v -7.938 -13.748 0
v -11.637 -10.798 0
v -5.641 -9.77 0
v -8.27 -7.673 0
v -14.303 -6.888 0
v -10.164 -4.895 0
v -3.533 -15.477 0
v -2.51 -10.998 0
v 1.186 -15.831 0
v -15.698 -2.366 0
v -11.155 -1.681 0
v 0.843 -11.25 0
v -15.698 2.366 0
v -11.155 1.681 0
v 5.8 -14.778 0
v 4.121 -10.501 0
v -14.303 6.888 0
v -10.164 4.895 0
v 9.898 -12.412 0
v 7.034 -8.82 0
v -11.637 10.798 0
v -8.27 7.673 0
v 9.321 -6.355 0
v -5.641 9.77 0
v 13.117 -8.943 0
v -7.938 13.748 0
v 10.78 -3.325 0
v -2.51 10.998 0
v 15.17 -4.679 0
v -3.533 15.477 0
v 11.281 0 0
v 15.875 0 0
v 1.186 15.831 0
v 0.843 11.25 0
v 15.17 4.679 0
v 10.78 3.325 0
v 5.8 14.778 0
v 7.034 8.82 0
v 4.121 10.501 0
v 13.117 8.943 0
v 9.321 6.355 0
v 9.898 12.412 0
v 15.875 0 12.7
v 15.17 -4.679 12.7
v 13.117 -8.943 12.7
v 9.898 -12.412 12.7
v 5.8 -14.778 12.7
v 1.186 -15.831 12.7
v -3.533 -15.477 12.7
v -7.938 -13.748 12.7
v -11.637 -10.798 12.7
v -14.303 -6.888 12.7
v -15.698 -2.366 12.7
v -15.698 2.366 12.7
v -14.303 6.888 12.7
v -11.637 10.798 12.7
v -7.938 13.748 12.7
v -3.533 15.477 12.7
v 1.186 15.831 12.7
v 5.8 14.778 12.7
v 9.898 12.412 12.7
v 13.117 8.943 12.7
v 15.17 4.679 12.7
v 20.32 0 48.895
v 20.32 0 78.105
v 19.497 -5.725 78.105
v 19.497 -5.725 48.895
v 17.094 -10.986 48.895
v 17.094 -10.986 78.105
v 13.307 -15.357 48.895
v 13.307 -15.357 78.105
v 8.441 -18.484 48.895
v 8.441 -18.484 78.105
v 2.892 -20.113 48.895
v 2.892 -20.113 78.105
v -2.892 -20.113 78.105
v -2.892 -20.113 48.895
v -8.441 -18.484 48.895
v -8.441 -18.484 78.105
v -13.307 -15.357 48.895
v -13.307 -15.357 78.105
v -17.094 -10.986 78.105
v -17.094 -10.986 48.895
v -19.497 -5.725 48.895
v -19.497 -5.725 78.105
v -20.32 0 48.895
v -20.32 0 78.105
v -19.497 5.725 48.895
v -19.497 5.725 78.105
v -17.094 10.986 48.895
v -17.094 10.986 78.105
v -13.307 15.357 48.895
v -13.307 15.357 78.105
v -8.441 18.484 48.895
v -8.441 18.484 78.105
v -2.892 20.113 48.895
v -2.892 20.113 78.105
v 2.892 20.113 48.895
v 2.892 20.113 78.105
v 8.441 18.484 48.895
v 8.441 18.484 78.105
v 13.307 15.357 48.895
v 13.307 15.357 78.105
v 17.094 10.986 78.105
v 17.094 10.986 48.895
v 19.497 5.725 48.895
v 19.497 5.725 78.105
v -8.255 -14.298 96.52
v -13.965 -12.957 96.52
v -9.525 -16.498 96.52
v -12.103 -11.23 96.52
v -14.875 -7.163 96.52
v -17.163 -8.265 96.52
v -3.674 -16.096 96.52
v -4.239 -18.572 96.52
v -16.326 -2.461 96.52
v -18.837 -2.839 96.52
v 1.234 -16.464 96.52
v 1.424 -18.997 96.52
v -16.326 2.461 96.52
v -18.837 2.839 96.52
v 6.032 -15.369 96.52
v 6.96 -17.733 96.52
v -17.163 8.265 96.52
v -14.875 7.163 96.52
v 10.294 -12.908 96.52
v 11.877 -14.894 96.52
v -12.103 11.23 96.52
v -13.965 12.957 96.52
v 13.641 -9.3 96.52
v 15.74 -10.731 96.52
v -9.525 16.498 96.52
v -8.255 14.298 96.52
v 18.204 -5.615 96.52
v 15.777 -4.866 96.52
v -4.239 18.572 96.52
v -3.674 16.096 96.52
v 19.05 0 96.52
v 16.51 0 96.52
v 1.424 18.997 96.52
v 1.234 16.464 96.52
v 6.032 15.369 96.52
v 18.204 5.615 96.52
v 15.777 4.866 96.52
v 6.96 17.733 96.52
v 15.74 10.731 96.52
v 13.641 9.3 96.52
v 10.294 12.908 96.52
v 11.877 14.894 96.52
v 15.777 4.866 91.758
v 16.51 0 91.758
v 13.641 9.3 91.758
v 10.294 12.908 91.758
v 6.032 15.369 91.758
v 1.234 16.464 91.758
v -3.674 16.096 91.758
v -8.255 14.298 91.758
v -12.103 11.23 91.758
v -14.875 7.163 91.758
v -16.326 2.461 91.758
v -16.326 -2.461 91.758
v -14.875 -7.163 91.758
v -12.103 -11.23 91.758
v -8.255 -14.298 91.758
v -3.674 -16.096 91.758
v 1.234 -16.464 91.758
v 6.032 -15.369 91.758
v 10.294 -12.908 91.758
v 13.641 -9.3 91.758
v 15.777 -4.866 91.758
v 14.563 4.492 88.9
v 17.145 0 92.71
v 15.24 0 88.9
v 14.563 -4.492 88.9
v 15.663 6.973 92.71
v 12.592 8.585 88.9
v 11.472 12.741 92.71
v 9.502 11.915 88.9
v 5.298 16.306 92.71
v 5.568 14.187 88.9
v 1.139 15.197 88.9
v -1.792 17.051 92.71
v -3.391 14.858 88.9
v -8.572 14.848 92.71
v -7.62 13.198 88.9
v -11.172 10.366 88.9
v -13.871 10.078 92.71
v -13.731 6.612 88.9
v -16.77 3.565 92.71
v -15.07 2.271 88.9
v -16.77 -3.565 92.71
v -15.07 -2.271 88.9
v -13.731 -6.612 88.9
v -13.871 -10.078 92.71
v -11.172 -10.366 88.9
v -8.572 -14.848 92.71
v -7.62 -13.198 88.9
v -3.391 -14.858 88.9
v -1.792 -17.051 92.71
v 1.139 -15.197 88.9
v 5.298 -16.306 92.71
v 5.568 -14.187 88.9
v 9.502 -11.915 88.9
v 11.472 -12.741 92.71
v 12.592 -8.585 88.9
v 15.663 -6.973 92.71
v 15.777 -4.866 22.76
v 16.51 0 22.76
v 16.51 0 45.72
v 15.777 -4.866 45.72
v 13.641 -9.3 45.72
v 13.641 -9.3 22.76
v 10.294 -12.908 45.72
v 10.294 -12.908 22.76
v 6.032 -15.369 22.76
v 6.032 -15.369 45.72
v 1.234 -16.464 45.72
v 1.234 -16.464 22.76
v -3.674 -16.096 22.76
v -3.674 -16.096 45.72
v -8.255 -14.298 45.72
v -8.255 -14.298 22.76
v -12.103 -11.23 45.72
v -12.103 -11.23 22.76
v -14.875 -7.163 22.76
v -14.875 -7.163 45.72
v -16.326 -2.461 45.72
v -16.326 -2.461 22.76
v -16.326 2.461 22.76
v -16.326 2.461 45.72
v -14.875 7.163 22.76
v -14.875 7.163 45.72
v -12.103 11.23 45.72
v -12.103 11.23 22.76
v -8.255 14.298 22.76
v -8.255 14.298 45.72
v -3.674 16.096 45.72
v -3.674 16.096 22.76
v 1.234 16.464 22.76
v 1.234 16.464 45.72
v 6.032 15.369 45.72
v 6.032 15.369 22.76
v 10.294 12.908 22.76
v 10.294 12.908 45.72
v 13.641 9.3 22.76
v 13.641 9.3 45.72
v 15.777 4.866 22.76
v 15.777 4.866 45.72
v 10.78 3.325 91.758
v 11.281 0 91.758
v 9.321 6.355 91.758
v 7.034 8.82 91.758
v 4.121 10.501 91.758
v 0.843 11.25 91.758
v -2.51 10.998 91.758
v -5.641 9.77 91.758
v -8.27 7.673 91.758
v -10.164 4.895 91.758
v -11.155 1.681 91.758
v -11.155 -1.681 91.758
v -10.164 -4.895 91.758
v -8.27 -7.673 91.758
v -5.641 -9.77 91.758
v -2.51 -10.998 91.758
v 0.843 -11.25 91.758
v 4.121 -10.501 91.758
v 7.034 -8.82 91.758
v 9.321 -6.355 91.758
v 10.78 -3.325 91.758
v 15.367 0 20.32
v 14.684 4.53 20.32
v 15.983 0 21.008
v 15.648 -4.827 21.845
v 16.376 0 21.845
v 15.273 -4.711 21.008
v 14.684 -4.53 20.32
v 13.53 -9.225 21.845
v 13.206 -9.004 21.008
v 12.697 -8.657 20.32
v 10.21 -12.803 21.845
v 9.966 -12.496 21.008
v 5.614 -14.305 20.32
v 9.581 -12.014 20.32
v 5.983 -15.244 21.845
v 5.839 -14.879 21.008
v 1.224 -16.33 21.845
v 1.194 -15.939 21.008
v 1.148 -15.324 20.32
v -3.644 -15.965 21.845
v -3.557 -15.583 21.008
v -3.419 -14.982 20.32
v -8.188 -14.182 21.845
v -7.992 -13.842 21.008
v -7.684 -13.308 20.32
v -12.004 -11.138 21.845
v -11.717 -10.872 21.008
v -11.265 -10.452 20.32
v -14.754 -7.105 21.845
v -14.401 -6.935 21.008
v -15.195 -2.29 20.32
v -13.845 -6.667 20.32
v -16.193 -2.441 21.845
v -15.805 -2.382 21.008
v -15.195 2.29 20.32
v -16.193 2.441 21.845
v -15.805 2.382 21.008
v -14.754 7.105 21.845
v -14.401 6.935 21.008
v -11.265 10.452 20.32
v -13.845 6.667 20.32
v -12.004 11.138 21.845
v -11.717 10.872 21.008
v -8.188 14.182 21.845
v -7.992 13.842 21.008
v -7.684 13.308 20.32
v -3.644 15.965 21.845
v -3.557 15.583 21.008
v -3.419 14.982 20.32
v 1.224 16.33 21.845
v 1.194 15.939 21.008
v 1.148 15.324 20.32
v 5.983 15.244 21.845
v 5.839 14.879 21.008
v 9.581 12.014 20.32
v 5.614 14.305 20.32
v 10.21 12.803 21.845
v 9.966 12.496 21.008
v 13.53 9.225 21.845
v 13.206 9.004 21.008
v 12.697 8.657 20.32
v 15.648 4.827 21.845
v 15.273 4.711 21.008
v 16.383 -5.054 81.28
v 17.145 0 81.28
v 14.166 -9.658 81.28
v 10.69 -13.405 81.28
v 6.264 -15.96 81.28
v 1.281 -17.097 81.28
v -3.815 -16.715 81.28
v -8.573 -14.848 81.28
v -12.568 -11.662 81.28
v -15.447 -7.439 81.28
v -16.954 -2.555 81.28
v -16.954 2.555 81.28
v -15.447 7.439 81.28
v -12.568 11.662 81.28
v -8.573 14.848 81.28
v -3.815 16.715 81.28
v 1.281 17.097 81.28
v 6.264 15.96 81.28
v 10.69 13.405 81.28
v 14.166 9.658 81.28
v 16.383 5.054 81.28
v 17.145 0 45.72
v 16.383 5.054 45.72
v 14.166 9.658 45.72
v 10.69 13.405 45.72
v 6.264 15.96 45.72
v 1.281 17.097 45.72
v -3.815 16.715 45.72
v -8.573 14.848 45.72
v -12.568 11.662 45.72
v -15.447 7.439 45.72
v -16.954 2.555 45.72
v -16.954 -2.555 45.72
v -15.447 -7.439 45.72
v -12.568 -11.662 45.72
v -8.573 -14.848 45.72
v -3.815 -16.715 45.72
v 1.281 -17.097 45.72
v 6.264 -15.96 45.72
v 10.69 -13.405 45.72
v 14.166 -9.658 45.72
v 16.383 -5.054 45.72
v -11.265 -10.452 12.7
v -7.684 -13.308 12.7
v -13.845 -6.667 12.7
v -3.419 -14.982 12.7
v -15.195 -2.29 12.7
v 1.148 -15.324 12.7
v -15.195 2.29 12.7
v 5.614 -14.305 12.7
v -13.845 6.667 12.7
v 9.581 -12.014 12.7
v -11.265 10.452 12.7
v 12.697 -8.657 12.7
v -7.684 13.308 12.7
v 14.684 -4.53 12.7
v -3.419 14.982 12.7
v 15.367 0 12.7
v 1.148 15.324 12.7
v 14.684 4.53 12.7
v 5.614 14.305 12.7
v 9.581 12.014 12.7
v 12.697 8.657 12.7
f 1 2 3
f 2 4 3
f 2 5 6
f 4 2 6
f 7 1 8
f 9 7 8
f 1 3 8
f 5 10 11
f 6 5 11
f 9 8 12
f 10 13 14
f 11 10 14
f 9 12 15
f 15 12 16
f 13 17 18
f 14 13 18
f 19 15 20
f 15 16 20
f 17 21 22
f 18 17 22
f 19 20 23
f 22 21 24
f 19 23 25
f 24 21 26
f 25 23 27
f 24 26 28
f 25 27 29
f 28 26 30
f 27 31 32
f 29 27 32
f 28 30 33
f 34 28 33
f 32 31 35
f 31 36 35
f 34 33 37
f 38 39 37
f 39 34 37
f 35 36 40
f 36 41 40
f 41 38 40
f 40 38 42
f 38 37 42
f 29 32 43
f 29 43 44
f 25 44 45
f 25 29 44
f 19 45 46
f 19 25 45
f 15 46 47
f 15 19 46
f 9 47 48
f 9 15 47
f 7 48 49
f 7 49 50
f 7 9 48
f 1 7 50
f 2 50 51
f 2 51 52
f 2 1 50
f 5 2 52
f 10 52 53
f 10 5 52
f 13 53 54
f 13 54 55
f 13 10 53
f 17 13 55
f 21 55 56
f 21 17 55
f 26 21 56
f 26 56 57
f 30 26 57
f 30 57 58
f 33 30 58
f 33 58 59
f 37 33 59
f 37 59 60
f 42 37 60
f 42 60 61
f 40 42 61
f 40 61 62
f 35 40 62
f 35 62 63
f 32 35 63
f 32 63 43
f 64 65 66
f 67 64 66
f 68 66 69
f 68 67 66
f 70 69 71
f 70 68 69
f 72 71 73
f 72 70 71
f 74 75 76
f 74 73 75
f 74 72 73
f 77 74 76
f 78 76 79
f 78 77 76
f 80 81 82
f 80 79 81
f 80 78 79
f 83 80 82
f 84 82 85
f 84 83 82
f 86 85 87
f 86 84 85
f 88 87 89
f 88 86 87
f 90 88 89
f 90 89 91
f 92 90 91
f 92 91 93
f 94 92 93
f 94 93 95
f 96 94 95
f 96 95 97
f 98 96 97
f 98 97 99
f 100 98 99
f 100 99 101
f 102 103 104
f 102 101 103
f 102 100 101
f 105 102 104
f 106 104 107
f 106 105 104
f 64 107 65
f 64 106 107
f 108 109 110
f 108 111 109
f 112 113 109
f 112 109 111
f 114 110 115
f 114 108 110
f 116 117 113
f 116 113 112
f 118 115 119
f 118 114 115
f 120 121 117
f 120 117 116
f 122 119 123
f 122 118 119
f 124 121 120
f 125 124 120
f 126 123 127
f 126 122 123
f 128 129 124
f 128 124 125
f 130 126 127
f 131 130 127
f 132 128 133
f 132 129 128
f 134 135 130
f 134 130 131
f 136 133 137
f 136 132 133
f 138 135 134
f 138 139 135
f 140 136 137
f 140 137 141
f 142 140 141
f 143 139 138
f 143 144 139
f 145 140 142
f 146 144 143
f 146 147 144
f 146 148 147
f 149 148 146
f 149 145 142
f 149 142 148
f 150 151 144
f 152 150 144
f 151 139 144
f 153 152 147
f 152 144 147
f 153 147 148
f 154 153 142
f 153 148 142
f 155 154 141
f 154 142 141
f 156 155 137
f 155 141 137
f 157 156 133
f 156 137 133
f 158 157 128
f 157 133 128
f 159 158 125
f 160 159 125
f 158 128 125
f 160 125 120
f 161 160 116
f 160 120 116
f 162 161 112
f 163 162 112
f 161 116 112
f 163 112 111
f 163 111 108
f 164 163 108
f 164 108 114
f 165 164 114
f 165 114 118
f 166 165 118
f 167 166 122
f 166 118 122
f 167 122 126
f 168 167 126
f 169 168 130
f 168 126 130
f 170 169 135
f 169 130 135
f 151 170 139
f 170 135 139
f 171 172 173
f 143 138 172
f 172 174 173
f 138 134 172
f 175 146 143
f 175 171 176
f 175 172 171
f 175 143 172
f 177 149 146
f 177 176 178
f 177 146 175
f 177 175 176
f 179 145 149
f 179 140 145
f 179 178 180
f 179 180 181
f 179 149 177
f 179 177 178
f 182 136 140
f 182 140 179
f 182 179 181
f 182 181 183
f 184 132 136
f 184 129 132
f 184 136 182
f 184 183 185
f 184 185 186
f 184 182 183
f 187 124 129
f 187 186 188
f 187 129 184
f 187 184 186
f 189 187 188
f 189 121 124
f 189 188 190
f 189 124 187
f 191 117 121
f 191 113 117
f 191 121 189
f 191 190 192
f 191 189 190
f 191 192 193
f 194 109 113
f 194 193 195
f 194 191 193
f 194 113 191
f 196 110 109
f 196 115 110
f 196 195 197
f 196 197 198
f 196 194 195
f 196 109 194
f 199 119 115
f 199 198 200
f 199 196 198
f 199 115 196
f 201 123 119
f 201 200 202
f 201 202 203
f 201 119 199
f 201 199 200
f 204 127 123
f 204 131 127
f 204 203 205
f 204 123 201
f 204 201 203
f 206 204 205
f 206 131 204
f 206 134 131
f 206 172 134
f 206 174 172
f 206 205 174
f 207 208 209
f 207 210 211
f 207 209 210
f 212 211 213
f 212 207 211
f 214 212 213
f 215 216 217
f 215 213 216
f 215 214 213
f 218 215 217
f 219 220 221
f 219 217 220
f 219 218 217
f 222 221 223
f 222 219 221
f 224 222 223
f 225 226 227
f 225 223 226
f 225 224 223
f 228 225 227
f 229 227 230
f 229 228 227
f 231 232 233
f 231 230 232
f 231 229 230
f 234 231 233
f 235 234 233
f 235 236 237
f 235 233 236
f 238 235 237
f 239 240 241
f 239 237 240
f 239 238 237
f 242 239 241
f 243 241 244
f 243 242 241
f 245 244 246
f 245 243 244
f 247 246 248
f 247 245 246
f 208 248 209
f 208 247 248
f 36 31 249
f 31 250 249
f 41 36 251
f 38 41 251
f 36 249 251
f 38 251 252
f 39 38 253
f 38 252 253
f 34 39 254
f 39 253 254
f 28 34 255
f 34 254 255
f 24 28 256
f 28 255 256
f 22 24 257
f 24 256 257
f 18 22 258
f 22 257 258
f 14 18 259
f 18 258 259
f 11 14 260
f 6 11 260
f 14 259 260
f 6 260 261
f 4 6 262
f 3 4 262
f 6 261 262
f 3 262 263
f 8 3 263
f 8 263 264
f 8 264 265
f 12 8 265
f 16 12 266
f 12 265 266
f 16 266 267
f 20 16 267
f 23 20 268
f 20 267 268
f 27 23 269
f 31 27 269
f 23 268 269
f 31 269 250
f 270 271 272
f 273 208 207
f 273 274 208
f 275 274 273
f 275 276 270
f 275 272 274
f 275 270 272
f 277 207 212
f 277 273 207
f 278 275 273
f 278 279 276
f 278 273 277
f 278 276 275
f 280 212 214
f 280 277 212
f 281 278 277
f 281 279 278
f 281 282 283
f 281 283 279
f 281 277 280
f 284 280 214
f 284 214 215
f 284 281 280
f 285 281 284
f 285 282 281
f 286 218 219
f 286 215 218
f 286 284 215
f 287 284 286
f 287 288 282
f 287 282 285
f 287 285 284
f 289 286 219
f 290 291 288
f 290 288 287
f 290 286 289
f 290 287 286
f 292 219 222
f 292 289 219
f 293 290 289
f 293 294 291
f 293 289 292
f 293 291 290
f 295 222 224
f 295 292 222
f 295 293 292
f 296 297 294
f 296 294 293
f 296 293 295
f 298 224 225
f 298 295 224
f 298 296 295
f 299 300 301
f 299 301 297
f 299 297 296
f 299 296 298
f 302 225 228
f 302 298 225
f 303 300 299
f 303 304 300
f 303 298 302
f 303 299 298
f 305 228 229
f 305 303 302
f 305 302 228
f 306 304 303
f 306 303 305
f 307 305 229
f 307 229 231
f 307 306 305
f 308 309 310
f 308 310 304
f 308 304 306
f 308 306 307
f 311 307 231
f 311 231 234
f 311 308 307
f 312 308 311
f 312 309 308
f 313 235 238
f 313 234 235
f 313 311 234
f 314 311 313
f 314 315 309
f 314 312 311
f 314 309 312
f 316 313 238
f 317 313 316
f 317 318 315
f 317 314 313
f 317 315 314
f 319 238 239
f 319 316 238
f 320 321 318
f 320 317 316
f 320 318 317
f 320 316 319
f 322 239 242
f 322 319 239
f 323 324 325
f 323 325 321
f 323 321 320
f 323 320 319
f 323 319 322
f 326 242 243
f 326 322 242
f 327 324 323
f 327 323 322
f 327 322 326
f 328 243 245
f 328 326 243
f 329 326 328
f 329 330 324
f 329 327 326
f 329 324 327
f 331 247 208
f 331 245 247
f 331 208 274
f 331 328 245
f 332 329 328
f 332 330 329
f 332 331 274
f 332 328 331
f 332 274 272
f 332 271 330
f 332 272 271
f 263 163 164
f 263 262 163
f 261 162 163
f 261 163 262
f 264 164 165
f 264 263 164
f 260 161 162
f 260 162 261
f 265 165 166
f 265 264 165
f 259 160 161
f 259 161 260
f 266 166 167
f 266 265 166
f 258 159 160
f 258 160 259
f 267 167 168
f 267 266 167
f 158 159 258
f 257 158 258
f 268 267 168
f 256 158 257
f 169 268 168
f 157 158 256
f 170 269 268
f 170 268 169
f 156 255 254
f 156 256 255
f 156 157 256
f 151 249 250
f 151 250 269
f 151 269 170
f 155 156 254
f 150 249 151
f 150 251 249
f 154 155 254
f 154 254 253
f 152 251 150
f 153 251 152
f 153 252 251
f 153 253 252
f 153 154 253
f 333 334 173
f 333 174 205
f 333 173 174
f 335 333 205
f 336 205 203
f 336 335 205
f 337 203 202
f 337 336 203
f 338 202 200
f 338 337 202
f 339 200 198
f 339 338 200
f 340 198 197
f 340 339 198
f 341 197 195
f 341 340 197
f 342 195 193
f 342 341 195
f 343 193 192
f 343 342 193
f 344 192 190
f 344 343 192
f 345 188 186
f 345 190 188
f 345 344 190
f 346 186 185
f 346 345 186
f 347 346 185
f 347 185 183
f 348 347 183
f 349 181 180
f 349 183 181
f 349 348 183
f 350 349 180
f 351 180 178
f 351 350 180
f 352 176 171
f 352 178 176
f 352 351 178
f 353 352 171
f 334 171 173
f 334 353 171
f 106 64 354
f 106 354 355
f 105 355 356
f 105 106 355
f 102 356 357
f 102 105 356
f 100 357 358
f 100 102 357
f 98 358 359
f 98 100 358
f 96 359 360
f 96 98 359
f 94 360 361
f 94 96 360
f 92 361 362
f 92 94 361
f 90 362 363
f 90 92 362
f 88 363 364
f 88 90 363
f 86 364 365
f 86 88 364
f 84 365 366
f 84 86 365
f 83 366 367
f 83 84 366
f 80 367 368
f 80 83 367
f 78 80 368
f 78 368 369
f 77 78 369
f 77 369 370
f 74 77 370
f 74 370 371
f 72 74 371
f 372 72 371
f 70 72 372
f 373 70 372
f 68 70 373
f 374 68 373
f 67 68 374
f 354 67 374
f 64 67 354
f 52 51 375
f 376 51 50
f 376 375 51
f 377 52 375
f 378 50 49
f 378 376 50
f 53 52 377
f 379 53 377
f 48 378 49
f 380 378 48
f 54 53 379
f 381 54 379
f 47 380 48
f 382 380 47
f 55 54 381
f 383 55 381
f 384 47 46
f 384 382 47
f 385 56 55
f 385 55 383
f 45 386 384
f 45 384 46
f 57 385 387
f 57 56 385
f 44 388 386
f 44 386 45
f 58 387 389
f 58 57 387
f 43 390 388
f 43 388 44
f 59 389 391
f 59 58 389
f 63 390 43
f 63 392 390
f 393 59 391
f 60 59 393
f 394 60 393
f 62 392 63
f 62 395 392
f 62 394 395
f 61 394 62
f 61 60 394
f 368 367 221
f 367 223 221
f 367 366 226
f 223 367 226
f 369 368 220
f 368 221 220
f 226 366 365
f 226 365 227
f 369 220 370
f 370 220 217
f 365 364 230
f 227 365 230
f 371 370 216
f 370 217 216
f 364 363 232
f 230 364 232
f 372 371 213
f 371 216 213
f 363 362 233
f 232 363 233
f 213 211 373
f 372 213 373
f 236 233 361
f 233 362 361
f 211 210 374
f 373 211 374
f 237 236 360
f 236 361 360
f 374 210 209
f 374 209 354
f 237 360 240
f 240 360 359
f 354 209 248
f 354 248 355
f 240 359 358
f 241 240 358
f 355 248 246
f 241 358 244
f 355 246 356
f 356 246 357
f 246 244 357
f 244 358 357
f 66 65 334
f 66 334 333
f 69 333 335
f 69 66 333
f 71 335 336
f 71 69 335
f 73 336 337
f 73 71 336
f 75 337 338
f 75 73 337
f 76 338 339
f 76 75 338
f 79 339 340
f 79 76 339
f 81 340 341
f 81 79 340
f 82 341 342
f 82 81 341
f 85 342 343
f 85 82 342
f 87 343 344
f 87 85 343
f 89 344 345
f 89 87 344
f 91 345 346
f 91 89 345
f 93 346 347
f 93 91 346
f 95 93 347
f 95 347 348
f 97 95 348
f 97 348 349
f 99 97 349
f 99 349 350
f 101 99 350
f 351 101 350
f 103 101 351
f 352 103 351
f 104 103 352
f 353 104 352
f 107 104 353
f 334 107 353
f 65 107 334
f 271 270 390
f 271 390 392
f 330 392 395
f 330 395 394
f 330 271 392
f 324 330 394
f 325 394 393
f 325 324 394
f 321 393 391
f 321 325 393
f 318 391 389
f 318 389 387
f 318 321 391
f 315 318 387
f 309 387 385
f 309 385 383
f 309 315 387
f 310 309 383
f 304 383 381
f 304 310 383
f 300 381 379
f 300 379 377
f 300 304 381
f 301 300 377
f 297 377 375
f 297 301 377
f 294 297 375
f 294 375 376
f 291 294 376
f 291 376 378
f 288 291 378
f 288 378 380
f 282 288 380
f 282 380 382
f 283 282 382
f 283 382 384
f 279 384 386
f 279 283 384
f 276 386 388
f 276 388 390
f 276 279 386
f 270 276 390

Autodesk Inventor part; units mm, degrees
ref_plane "YZ Plane" through (0, 0, 0) normal (1, 0, 0) x (0, 1, 0)
ref_plane "XZ Plane" through (0, 0, 0) normal (0, 1, 0) x (-1, 0, 0)
sketch "Sketch1" plane through (0, 0, 0) normal (0, 0, 1) x (1, 0, 0)
  circle A0 centre (0, 0) radius 15.875
  dimension "d0" = 31.75
extrude "Extrusion1" add sketch "Sketch1" along normal blind 20.32
sketch "Sketch2" plane through (0, 0, 20.32) normal (0, 0, 1) x (1, 0, 0)
  circle A0 centre (0, 0) radius 15.367
  circle A1 centre (0, 0) radius 16.7085
  dimension "d5" = 30.734
extrude "Extrusion2" cut sketch "Sketch2" against normal blind 7.62
sketch "Sketch3" plane through (0, 0, 20.32) normal (0, 0, 1) x (1, 0, 0)
  circle A0 centre (0, 0) radius 16.51
  dimension "d6" = 33.02
extrude "Extrusion3" add sketch "Sketch3" along normal blind 25.4
fillet "Fillet1" radius 3.175 1 edges at (-16.51, 0, 20.32)
sketch "Sketch4" plane through (0, 0, 45.72) normal (0, 0, 1) x (1, 0, 0)
  circle A0 centre (0, 0) radius 20.32
  dimension "d10" = 40.64
extrude "Extrusion4" add sketch "Sketch4" along normal blind 35.56
chamfer "Chamfer1" distance 3.175 angle 45 2 edges at (-20.32, 0, 45.72) (-20.32, 0, 81.28)
sketch "Sketch5" plane through (0, 0, 0) normal (0, 1, 0) x (-1, 0, 0)
  point P0 (0, 0)
ref_plane "Work Plane1" through (0, 0, 88.9) normal (0, 0, 1) x (1, 0, 0)
sketch "Sketch6" plane through (0, 0, 88.9) normal (0, 0, 1) x (1, 0, 0)
  circle A0 centre (0, 0) radius 15.24
  dimension "d17" = 30.48
loft "Loft1" add profiles "Sketch6" section 1 edges at (-17.145, 0, 81.28)
ref_plane "Work Plane2" through (0, 0, 96.52) normal (0, 0, 1) x (1, 0, 0)
sketch "Sketch7" plane through (0, 0, 96.52) normal (0, 0, 1) x (1, 0, 0)
  circle A0 centre (0, 0) radius 19.05
  dimension "d23" = 38.1
loft "Loft2" add profiles "Sketch7" section 1 edges at (-15.24, 0, 88.9)
sketch "Sketch8" plane through (0, 0, 96.52) normal (0, 0, 1) x (1, 0, 0)
  circle A0 centre (0, 0) radius 16.51
extrude "Extrusion5" cut sketch "Sketch8" against normal blind 4.7625
sketch "Sketch9" plane through (0, 0, 91.7575) normal (0, 0, 1) x (1, 0, 0)
  circle A0 centre (0, 0) radius 11.2811
extrude "Extrusion6" cut sketch "Sketch9" against normal blind 120.65
properties part number "okular" material "Iron, Cast"
